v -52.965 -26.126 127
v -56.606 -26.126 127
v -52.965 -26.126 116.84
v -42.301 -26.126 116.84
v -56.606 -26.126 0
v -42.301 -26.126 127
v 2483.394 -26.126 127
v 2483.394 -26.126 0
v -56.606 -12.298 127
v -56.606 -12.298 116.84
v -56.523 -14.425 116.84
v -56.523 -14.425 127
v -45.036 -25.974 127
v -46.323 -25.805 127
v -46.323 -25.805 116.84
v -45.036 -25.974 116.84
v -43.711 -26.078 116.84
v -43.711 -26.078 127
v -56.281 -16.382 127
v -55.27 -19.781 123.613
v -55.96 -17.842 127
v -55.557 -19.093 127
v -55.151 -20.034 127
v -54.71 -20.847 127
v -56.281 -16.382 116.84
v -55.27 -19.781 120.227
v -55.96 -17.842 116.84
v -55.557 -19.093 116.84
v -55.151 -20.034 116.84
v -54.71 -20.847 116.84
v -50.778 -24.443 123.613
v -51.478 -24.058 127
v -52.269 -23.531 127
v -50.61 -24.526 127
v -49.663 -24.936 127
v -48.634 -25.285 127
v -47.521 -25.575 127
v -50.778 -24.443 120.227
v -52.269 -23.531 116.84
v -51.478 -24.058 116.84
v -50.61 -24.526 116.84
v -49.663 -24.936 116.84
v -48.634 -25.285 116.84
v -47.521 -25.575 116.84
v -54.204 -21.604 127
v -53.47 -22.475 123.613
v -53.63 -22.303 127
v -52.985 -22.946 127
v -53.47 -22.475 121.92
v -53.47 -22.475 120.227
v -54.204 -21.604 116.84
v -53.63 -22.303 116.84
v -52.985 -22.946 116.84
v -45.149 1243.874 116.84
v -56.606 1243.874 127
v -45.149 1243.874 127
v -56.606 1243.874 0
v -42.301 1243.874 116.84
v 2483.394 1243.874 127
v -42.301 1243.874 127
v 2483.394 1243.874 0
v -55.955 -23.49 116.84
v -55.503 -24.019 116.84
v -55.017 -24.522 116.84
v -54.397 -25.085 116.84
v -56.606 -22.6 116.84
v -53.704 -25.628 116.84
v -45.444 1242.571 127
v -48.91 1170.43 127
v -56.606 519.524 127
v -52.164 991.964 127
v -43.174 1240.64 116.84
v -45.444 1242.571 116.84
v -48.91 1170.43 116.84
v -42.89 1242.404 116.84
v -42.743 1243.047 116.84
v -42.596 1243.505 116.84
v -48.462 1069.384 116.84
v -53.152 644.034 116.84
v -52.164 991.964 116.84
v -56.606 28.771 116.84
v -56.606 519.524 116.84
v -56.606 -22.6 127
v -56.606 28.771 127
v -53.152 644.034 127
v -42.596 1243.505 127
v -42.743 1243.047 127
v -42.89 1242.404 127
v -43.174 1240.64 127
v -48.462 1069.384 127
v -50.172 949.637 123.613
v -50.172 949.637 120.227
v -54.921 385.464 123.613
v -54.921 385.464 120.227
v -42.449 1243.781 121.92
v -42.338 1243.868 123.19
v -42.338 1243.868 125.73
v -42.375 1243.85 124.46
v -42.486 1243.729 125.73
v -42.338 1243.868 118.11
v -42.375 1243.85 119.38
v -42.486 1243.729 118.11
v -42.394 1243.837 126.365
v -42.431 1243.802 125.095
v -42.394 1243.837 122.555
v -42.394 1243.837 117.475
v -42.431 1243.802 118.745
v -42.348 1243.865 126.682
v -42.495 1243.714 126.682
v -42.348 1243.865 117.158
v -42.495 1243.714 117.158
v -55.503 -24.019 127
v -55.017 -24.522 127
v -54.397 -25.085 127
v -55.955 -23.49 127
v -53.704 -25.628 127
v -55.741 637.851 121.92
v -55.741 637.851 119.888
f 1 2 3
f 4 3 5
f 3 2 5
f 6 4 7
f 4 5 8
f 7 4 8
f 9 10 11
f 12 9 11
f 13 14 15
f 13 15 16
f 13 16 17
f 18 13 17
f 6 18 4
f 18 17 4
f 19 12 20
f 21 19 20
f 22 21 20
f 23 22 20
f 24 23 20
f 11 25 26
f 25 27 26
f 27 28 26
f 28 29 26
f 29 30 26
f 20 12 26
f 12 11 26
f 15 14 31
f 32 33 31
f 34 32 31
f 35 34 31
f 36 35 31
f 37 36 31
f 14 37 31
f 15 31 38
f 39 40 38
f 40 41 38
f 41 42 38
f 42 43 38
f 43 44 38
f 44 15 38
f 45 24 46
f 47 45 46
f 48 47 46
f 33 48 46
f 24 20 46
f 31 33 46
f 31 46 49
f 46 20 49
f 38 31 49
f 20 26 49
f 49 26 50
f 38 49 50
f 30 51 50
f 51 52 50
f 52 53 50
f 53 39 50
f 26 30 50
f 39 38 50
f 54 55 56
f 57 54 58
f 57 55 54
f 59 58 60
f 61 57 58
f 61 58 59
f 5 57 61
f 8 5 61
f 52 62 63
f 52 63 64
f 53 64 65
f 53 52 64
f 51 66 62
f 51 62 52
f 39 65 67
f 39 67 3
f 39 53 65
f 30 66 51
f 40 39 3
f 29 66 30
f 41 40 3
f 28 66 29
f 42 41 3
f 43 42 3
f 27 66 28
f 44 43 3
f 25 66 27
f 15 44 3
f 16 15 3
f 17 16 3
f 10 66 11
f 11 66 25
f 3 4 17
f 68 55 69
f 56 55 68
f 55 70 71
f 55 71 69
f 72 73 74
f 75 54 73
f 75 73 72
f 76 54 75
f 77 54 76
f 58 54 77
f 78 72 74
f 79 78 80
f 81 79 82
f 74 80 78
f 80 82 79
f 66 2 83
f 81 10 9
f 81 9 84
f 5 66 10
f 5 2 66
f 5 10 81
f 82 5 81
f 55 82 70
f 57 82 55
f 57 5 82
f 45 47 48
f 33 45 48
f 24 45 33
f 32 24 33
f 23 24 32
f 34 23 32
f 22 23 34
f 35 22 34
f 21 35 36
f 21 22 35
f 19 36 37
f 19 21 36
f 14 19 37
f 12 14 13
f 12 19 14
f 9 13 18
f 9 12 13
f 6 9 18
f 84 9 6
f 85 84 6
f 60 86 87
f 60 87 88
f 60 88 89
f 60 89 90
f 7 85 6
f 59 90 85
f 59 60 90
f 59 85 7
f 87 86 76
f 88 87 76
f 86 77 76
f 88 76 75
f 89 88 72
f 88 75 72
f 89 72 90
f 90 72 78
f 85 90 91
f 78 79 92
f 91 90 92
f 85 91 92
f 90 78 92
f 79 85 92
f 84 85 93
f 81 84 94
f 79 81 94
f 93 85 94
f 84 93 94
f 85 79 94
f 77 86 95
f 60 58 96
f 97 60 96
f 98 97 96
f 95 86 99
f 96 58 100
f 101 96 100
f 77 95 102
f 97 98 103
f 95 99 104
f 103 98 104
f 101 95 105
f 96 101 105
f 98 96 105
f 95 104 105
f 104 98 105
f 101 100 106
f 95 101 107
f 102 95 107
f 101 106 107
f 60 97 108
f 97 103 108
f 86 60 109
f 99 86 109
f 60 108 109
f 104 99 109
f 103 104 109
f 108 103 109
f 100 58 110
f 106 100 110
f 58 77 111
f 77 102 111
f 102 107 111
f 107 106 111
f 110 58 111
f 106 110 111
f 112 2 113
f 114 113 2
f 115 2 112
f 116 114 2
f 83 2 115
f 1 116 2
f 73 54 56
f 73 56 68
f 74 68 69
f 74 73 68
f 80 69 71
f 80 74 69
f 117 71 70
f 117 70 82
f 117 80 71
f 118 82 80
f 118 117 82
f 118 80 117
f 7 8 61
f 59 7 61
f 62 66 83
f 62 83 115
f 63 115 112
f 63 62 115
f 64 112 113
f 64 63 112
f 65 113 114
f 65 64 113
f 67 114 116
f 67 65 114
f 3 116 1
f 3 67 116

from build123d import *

# Parameters (mm, degrees)
SKETCH2_W               = 2540
SKETCH2_H               = 1270
BOSS_EXTRUDE1_DEPTH     = 127
CUT_EXTRUDE_THIN7_START = -10.16
CUT_EXTRUDE_THIN7_DEPTH = 10.16


# Read off the part's stored shape, not the designer's step: Cut-Extrude-Thin7
with BuildPart() as part:
    # Sketch2 → Boss-Extrude1 (new body)
    with BuildSketch(Plane.XY):
        with Locations((1213.394285714, 608.874285714)):
            Rectangle(SKETCH2_W, SKETCH2_H)
    extrude(amount=BOSS_EXTRUDE1_DEPTH)

    # Cut-Extrude-Thin7 outline → Cut-Extrude-Thin7 (cut)
    with BuildSketch(Plane.XY.offset(127).offset(CUT_EXTRUDE_THIN7_START)):
        with BuildLine():
            Line((-56.605714286, -12.298264237), (-56.605714286, -22.600135555))
            add(Edge.make_bspline(
                [(-56.605714286, -22.600135555), (-56.222595532, -23.177940395), (-55.789824429, -23.723358369), (-54.621251066, -24.947308754), (-53.835801705, -25.583360111), (-52.965066872, -26.125714295)],
                knots=[0.415422097, 0.415422097, 0.415422097, 0.415422097, 0.5, 0.5, 0.620302006, 0.620302006, 0.620302006, 0.620302006], degree=3))
            Line((-52.965066872, -26.125714295), (-42.301285071, -26.125714286))
            add(Edge.make_bspline(
                [(-56.605714286, -12.298264237), (-56.572762187, -21.137617087), (-53.045670494, -25.98669824), (-42.301285071, -26.125714286)],
                knots=[0, 0, 0, 0, 1, 1, 1, 1], degree=3))
        make_face()
        with BuildLine():
            Line((-56.605714286, 519.524275061), (-56.605714288, 28.771147167))
            add(Edge.make_bspline(
                [(-42.301285071, 1243.874285714), (-51.75315576, 1243.743654698), (-56.433053692, 122.584401155), (-56.605714288, 28.771147167)],
                knots=[0, 0, 0, 0, 0.963079213, 0.963079213, 0.963079213, 0.963079213], degree=3))
            Line((-42.301285071, 1243.874285714), (-45.149377592, 1243.874285724))
            add(Edge.make_bspline(
                [(-45.149377592, 1243.874285724), (-45.172892669, 1243.792956079), (-45.19510448, 1243.711148911), (-45.317669219, 1243.237343993), (-45.403042669, 1242.815848994), (-45.568694933, 1241.856029834), (-45.647658785, 1241.319762305), (-45.880529985, 1239.521000622), (-46.030221772, 1238.068360897), (-46.326025387, 1234.640128323), (-46.471737542, 1232.665915968), (-46.904334267, 1225.977209037), (-47.186617939, 1220.49661804), (-47.740926489, 1207.621310865), (-48.012846197, 1200.227338063), (-49.347176032, 1158.83150694), (-50.333944851, 1111.5479368), (-53.056891367, 941.226989356), (-54.555044994, 789.729621863), (-56.050439857, 598.211796401), (-56.338672434, 558.546955358), (-56.605714286, 519.524275061)],
                knots=[0.013961909, 0.013961909, 0.013961909, 0.013961909, 0.015625, 0.015625, 0.0234375, 0.0234375, 0.03125, 0.03125, 0.046875, 0.046875, 0.0625, 0.0625, 0.09375, 0.09375, 0.125, 0.125, 0.25, 0.25, 0.5, 0.5, 0.565247658, 0.565247658, 0.565247658, 0.565247658], degree=3))
        make_face()
    extrude(amount=CUT_EXTRUDE_THIN7_DEPTH, mode=Mode.SUBTRACT)


solid = part.part
